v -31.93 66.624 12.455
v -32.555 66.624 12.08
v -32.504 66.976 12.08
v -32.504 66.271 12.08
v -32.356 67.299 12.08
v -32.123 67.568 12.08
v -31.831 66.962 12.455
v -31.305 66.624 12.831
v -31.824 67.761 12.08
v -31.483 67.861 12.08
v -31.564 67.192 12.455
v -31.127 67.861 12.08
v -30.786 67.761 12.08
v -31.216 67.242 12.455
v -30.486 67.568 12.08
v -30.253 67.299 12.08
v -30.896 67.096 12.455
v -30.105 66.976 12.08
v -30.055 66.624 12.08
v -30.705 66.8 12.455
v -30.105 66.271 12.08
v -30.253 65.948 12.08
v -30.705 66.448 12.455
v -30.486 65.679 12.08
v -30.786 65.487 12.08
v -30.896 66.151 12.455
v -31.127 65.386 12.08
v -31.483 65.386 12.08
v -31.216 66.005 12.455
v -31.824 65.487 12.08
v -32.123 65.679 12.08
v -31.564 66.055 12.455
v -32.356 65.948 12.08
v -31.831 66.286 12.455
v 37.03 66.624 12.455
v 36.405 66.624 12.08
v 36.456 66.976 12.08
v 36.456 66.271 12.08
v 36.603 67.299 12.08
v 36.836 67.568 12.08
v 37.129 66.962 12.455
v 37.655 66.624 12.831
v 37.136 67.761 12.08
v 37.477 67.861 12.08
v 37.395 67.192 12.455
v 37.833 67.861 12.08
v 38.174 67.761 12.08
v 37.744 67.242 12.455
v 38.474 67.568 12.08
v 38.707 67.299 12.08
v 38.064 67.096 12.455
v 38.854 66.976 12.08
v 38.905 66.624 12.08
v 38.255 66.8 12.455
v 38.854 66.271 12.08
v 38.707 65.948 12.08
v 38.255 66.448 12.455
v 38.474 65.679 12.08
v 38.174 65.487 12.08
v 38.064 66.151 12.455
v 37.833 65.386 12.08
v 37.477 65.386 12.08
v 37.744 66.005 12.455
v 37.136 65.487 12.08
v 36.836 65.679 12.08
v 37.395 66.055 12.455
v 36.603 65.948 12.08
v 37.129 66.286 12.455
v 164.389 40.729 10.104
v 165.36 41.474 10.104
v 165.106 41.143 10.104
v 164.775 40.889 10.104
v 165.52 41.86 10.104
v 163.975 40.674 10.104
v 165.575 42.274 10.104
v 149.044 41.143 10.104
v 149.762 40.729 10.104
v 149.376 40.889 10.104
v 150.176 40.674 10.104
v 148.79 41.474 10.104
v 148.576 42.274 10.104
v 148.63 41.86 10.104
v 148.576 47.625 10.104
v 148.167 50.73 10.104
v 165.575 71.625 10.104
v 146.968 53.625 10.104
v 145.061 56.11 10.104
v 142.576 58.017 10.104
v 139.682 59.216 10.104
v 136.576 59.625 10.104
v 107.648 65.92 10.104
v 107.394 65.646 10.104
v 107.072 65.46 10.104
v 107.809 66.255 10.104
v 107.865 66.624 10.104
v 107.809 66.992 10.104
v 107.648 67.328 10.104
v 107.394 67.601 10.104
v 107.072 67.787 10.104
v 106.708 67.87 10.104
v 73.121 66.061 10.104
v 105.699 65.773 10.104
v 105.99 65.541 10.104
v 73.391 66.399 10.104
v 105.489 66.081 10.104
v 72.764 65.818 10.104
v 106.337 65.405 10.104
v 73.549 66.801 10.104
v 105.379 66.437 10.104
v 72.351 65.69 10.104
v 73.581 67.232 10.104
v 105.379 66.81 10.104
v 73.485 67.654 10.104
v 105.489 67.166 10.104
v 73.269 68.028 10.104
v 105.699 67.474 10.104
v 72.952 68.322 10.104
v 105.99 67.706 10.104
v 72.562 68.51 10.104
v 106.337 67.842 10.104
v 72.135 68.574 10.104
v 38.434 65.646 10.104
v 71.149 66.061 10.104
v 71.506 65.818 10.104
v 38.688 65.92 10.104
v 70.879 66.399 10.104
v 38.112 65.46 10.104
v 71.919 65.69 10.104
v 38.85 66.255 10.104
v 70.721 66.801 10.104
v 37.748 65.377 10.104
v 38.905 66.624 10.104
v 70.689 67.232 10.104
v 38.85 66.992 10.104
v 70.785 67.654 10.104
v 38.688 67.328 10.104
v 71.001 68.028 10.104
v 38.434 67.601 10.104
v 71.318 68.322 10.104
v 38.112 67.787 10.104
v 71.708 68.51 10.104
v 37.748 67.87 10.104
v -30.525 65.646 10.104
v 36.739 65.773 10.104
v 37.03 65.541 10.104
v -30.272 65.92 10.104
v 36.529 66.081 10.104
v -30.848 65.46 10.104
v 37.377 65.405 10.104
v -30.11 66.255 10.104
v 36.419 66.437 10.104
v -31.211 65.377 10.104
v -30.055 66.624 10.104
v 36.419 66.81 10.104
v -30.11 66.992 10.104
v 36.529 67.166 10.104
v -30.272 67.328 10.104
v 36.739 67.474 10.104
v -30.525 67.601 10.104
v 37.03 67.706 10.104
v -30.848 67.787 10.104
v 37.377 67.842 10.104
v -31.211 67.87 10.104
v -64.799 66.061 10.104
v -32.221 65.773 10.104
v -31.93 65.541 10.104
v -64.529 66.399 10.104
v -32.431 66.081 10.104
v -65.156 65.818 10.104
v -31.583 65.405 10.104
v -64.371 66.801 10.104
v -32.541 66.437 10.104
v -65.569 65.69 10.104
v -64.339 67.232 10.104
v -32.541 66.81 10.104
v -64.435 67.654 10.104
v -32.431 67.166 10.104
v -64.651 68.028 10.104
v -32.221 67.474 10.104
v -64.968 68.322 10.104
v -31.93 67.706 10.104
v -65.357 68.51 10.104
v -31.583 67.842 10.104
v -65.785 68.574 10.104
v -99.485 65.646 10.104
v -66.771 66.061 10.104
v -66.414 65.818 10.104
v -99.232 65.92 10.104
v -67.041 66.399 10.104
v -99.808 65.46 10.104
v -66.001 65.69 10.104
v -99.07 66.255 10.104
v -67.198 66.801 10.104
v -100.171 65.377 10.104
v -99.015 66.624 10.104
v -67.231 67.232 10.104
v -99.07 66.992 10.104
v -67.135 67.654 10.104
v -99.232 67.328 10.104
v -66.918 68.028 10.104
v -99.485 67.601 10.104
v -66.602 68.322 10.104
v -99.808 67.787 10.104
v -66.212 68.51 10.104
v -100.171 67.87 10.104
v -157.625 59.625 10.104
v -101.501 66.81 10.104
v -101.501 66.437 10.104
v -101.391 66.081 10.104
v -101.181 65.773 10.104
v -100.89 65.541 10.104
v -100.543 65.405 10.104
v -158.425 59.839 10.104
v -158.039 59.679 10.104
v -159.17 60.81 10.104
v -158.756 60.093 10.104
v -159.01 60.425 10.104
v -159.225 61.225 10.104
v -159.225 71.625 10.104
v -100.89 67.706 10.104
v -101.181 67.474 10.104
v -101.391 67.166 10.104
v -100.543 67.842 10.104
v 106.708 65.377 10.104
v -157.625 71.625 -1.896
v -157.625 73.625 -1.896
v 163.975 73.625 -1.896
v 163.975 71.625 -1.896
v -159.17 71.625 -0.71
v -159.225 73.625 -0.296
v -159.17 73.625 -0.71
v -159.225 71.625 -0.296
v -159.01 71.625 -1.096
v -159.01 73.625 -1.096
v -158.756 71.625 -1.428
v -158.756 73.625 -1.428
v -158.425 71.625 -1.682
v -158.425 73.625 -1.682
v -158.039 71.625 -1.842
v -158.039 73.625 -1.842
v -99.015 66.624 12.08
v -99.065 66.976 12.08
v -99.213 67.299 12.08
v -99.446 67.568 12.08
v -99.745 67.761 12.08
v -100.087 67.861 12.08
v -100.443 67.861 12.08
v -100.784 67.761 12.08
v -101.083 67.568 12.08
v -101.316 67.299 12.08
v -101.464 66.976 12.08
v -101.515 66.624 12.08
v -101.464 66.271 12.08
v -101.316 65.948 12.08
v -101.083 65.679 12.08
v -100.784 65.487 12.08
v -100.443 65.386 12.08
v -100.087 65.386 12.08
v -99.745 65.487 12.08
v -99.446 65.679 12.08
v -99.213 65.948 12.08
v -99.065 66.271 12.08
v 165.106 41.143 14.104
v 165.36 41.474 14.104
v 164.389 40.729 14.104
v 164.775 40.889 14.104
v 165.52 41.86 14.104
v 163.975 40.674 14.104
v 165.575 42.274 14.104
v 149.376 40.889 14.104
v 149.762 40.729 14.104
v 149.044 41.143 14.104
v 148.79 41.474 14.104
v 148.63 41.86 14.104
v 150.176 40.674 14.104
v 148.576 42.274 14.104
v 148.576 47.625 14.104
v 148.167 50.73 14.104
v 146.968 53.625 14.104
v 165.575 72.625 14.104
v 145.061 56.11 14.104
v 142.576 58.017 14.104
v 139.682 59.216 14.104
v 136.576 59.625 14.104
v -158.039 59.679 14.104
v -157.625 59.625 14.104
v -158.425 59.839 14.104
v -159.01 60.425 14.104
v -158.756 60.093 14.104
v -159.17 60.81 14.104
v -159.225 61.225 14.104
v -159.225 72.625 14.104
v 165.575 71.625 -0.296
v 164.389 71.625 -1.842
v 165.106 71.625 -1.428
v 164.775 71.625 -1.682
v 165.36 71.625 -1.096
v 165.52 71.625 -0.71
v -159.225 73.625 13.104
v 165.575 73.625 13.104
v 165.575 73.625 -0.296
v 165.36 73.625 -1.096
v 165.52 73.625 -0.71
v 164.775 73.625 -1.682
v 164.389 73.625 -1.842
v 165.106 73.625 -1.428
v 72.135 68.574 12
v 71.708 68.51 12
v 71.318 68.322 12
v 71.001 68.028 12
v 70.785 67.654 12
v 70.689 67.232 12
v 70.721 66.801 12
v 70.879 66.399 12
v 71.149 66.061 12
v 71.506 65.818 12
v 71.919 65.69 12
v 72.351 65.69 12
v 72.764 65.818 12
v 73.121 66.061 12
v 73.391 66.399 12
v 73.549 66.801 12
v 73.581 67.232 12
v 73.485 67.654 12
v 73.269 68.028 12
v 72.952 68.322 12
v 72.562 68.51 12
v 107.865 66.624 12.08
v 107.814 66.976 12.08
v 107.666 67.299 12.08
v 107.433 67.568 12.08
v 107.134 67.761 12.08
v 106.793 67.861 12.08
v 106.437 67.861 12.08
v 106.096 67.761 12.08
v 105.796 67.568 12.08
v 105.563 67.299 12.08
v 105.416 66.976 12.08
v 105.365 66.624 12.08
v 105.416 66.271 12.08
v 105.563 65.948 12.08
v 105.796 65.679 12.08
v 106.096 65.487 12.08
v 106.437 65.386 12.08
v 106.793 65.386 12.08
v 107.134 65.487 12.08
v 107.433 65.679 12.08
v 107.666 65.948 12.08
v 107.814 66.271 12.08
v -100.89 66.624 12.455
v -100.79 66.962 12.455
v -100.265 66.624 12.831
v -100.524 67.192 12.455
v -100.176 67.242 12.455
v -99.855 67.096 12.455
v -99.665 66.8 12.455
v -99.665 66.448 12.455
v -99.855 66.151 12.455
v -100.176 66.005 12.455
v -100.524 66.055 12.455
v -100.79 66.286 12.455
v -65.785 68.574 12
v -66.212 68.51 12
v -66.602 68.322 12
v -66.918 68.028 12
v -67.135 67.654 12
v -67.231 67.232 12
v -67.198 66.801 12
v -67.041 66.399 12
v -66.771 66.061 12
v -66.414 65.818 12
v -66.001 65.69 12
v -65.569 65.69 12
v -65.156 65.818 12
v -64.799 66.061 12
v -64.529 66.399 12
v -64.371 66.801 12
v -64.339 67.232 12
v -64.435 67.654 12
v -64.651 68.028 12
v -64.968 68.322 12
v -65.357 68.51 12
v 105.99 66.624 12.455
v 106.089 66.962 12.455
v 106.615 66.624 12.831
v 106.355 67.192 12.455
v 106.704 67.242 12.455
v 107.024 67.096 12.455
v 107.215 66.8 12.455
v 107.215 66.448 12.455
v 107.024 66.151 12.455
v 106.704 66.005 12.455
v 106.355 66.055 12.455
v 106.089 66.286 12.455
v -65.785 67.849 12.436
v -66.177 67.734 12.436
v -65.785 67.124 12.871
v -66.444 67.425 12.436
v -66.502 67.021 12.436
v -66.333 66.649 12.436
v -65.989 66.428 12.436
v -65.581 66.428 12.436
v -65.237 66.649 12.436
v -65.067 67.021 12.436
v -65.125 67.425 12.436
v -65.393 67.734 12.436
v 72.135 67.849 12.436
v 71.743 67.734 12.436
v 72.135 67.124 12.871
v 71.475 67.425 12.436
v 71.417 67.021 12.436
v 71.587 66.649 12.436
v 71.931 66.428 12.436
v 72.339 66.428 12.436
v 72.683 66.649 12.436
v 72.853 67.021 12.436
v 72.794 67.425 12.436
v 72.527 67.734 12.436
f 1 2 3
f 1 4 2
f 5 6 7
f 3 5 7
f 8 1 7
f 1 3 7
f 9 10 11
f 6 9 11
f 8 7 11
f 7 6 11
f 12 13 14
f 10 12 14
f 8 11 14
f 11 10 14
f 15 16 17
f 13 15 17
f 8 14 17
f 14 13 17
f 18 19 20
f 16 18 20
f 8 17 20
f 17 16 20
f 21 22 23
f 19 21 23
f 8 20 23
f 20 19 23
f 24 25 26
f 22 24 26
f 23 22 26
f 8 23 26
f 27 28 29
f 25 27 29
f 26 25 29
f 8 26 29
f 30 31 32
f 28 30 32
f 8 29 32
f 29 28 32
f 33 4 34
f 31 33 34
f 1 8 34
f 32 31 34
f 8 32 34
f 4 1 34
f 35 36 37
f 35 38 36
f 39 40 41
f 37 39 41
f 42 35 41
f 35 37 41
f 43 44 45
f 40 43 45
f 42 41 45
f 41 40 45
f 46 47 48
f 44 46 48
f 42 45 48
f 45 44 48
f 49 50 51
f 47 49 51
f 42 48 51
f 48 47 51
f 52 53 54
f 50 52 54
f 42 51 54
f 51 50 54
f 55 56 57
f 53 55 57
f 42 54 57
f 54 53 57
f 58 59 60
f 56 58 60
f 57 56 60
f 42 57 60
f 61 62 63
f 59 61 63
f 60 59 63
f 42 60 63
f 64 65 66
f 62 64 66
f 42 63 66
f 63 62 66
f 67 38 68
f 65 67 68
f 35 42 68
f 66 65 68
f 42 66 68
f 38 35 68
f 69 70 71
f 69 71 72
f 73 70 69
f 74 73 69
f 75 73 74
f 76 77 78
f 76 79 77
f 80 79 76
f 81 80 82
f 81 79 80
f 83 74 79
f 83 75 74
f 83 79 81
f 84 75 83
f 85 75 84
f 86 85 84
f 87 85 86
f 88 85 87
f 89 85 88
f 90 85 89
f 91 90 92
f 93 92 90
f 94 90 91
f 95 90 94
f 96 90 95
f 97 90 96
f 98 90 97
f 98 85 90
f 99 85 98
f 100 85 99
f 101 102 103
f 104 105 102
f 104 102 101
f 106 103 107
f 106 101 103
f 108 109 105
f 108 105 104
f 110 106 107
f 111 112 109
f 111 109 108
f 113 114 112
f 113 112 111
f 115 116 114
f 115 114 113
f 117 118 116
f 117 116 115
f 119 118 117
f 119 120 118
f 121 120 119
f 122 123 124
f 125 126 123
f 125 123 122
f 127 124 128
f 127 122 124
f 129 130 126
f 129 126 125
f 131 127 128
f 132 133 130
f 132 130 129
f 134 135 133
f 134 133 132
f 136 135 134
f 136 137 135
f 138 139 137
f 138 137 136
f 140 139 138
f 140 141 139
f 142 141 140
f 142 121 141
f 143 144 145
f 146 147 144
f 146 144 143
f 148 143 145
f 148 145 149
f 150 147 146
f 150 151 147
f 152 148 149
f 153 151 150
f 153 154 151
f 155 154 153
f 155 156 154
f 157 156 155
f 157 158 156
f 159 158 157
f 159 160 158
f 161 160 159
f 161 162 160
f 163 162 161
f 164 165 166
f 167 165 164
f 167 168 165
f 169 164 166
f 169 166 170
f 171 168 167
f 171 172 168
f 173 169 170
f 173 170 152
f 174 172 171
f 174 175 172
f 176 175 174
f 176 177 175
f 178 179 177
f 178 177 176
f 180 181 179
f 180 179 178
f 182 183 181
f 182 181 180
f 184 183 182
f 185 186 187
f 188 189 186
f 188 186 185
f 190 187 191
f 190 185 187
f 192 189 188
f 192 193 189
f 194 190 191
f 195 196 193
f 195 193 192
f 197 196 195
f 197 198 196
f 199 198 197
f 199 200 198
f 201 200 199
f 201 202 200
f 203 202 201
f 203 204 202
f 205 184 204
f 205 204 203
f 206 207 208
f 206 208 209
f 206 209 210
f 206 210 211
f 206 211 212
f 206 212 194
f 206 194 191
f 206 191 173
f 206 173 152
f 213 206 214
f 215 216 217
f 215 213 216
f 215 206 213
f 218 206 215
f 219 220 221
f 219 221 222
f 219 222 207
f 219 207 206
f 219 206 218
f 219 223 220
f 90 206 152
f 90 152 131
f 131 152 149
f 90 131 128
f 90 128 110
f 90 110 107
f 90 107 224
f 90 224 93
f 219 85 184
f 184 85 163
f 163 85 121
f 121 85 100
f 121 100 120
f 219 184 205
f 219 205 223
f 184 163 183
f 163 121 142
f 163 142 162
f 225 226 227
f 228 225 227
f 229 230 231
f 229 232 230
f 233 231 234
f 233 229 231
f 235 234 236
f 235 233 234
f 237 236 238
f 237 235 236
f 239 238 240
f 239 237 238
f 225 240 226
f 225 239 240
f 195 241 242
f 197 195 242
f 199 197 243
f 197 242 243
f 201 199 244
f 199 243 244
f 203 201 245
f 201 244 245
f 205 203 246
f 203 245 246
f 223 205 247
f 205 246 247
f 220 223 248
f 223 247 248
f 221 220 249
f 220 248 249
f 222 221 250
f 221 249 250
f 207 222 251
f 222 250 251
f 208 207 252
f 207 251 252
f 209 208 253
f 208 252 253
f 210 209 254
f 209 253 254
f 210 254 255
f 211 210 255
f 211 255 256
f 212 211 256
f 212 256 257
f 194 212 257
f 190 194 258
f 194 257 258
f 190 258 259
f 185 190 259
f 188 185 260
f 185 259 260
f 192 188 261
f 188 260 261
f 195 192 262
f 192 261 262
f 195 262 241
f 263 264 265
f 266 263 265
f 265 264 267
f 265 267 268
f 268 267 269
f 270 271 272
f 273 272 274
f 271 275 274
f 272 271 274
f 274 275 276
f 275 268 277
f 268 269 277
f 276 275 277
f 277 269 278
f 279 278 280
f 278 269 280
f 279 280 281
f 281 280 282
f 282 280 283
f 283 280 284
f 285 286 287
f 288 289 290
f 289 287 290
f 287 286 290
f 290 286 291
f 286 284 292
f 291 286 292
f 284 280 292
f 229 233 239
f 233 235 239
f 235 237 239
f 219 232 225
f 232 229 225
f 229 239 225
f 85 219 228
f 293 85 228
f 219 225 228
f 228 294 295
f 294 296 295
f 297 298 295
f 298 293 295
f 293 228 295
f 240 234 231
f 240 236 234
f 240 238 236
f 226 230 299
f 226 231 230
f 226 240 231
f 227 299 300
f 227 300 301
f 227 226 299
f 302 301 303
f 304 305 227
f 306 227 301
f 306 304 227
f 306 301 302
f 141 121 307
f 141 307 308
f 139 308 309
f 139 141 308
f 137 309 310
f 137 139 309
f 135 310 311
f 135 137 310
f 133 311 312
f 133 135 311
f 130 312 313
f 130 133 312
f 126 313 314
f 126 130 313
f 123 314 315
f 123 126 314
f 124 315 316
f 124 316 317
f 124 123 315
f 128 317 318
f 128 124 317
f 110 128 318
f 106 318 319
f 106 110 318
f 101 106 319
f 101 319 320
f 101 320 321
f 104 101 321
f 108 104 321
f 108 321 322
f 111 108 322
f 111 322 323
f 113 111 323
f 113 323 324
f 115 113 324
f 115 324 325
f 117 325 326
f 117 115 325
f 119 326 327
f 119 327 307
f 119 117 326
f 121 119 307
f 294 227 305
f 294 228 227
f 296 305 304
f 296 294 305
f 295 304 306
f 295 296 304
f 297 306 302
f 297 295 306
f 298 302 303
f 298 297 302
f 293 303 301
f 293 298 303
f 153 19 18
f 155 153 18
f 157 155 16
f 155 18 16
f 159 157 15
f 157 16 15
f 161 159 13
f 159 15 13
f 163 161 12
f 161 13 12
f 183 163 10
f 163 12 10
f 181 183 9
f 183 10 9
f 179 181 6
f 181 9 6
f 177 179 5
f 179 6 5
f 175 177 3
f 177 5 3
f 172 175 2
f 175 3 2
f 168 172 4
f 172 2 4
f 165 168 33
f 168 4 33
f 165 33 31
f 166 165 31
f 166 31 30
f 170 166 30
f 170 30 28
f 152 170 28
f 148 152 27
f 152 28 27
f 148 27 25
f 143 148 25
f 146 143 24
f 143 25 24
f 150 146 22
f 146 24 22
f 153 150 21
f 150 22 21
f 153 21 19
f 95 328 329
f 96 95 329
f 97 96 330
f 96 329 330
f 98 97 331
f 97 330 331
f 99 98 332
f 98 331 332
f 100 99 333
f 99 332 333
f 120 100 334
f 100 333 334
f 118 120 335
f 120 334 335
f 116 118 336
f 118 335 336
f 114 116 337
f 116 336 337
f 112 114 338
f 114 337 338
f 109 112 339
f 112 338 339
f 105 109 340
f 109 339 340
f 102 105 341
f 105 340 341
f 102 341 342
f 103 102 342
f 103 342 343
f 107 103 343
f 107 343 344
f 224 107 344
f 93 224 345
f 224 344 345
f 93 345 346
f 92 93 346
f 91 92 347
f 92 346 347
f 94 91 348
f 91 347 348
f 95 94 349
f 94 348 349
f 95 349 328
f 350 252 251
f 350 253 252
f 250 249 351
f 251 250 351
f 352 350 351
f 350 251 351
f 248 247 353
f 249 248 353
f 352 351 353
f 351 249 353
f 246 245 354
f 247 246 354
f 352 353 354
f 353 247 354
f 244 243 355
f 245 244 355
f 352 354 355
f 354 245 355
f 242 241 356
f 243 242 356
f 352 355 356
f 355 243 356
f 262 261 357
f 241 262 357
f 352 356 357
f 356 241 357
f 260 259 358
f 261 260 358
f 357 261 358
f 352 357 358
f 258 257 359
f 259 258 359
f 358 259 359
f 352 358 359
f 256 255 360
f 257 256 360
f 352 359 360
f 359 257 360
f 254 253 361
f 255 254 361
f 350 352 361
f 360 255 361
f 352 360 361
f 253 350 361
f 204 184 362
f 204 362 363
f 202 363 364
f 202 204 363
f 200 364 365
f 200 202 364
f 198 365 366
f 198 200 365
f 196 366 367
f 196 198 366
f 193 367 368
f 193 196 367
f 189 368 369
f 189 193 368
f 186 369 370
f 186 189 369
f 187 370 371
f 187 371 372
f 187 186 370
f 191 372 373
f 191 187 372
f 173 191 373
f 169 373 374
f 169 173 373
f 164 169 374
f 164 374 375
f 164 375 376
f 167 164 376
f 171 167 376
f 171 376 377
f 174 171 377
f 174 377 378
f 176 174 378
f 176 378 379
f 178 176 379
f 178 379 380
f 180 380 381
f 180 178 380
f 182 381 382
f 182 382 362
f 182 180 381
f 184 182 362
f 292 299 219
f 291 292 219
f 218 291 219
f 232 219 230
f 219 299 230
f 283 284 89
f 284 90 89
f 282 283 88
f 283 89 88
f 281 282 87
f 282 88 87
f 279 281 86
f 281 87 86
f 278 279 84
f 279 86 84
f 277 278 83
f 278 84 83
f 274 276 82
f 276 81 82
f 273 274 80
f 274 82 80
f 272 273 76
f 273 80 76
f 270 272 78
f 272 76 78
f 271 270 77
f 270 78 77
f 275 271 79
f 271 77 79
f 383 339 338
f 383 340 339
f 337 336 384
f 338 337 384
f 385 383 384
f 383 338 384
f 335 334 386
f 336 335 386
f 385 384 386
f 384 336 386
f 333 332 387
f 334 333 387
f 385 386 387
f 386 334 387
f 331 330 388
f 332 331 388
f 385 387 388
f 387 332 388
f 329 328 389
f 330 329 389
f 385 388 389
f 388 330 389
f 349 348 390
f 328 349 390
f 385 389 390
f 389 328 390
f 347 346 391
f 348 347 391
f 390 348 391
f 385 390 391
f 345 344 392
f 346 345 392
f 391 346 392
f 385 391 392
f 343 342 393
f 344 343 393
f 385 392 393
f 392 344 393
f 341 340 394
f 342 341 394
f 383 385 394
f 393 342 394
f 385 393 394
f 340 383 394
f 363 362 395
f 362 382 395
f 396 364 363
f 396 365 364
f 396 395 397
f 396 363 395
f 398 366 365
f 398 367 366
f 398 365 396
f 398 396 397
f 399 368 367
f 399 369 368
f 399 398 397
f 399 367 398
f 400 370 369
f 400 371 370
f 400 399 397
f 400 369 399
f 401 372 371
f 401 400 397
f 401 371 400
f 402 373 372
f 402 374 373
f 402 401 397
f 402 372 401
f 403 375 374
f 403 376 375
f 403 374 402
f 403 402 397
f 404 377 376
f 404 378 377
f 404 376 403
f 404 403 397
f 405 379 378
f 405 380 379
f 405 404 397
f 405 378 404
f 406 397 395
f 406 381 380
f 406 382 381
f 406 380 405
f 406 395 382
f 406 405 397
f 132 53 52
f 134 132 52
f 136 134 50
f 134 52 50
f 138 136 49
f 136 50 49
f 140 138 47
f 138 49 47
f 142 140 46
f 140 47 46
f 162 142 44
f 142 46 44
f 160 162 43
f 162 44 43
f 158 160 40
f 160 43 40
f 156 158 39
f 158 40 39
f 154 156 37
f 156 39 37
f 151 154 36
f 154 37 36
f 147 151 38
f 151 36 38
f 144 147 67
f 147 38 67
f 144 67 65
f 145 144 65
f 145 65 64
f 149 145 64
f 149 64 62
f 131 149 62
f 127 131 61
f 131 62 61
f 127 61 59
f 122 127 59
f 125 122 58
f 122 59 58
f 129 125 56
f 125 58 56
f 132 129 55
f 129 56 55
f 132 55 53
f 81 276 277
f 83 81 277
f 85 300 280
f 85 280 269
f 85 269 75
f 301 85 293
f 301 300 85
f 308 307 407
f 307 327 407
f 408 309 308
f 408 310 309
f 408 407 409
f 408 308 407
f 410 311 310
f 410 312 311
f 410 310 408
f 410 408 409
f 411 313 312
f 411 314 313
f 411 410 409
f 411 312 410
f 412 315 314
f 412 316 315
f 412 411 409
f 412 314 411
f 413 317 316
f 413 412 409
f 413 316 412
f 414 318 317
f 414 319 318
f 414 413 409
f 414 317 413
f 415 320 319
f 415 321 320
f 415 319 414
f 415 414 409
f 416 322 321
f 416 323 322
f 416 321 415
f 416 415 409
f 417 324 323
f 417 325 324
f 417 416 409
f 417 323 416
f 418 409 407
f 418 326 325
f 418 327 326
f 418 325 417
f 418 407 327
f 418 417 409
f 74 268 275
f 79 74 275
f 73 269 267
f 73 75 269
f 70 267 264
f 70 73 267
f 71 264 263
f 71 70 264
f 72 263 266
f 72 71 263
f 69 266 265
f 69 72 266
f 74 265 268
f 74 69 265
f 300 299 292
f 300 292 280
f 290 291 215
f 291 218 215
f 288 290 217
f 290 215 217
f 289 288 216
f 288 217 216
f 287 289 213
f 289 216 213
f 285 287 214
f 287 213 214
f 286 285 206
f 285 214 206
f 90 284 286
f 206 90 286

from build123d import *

# Parameters (mm, degrees)
BOSS_EXTRUDE1_DEPTH                          = 4
SKETCH3_W                                    = 324.79935
SKETCH3_H                                    = 12
BOSS_EXTRUDE2_DEPTH                          = 2
FILLET1_SIZE                                 = 1
FILLET2_R                                    = 1.6
FILLET3_R                                    = 12
TAP_DRILL_FOR_M3X0_5_TAP1_D                  = 2.5
TAP_DRILL_FOR_M3X0_5_TAP1_DEPTH              = 7
TAP_DRILL_FOR_M3X0_5_TAP1_CSINK_D            = 2.55
TAP_DRILL_FOR_M3X0_5_TAP1_CSINK_ANGLE        = 90
TAP_DRILL_FOR_M3X0_5_TAP1_TIP                = 0.751075774
CBORE_FOR_M2_5_HEX_SOCKET_HEAD_CAP_S_2_COUNT = 2
CBORE_FOR_M2_5_HEX_SOCKET_HEAD_CAP_S_2_PITCH = 343.798403
CBORE_FOR_M2_5_HEX_SOCKET_HEAD_CAP_S_3_COUNT = 2
CBORE_FOR_M2_5_HEX_SOCKET_HEAD_CAP_S_3_PITCH = 369.079907741
CBORE_FOR_M2_5_HEX_SOCKET_HEAD_CAP_S_4_COUNT = 2
CBORE_FOR_M2_5_HEX_SOCKET_HEAD_CAP_S_4_PITCH = 275.745768266
CBORE_FOR_M2_5_HEX_SOCKET_HEAD_CAP_S_5_COUNT = 2
CBORE_FOR_M2_5_HEX_SOCKET_HEAD_CAP_S_5_PITCH = 169.171931368
CBORE_FOR_M2_5_HEX_SOCKET_HEAD_CAP_S_6_COUNT = 2
CBORE_FOR_M2_5_HEX_SOCKET_HEAD_CAP_S_6_PITCH = 134.248413


with BuildPart() as part:
    # Sketch2 → Boss-Extrude1 (new body)
    with BuildSketch(Plane.XY.offset(14.1038)):
        Polygon((-159.224575, 59.6246), (-159.224575, 73.6246), (165.574775, 73.6246), (165.574775, 59.6246), (165.574775, 40.6744), (148.575775, 40.6744), (148.575775, 59.6246), align=None)
    extrude(amount=-BOSS_EXTRUDE1_DEPTH)

    # Sketch3 → Boss-Extrude2 (add)
    with BuildSketch(Plane(origin=(0, 73.6246, 0), x_dir=(1, 0, 0), z_dir=(0, 1, 0))):
        with Locations((3.1751, -4.1038)):
            Rectangle(SKETCH3_W, SKETCH3_H)
    extrude(amount=-BOSS_EXTRUDE2_DEPTH)

    # Fillet1
    fillet1_edges = [part.edges().sort_by_distance(p)[0] for p in [
        (3.1751, 73.6246, 14.1038),
    ]]
    chamfer(fillet1_edges, length=FILLET1_SIZE)

    # Fillet2
    fillet2_edges = [part.edges().sort_by_distance(p)[0] for p in [
        (165.574775, 40.6744, 12.1038),
        (148.575775, 40.6744, 12.1038),
        (-159.224575, 59.6246, 12.1038),
        (165.574775, 72.6246, -1.8962),
        (-159.224575, 72.6246, -1.8962),
    ]]
    fillet(fillet2_edges, radius=FILLET2_R)

    # Fillet3
    fillet3_edges = [part.edges().sort_by_distance(p)[0] for p in [
        (148.575775, 59.6246, 12.1038),
    ]]
    fillet(fillet3_edges, radius=FILLET3_R)

    # Tap Drill for M3x0.5 Tap1
    with Locations(Plane(origin=(0, 0, 5.0798), x_dir=(-1, 0, 0), z_dir=(0, 0, -1))):
        with Locations((-106.614905, 66.623653), (-37.655035, 66.623653), (31.304835, 66.623653), (100.264705, 66.623653), (100.264705, -66.62476), (31.304835, -66.62476), (-37.655035, -66.62476), (-106.614905, -66.62476)):
            CounterSinkHole(TAP_DRILL_FOR_M3X0_5_TAP1_D / 2, TAP_DRILL_FOR_M3X0_5_TAP1_CSINK_D / 2, depth=TAP_DRILL_FOR_M3X0_5_TAP1_DEPTH, counter_sink_angle=TAP_DRILL_FOR_M3X0_5_TAP1_CSINK_ANGLE)
            with Locations((0, 0, -(TAP_DRILL_FOR_M3X0_5_TAP1_DEPTH + TAP_DRILL_FOR_M3X0_5_TAP1_TIP / 2))):  # 118° drill point
                Cone(0, TAP_DRILL_FOR_M3X0_5_TAP1_D / 2, TAP_DRILL_FOR_M3X0_5_TAP1_TIP, mode=Mode.SUBTRACT)

    # Sketch7 → CBORE for M2.5 Hex Socket Head Cap Screw1 (revolve, cut)
    with BuildSketch(Plane(origin=(-168.7241015, -67.1242865, -6), x_dir=(0, 1, 0), z_dir=(1, 0, 0))):
        Polygon((0, 0), (0, 18.871247898), (1.45, 18), (1.45, 5.9), (2.75, 5.9), (2.75, 0.025), (2.775, 0), align=None)
    cbore_for_m2_5_hex_socket_head_cap_screw = revolve(axis=Axis((-168.7241015, -67.1242865, -12.35), (0, 0, 1)), mode=Mode.SUBTRACT)

    # CBORE for M2.5 Hex Socket Head Cap S 2: CBORE for M2.5 Hex Socket Head Cap Screw1 ×2
    with Locations(*[(i * CBORE_FOR_M2_5_HEX_SOCKET_HEAD_CAP_S_2_PITCH, 0, 0) for i in range(1, CBORE_FOR_M2_5_HEX_SOCKET_HEAD_CAP_S_2_COUNT)]):
        add(cbore_for_m2_5_hex_socket_head_cap_screw, mode=Mode.SUBTRACT)

    # CBORE for M2.5 Hex Socket Head Cap S 3: CBORE for M2.5 Hex Socket Head Cap Screw1 ×2
    with Locations(*[Vector(0.9315012705620509, 0.3637380691394355, 0) * (i * CBORE_FOR_M2_5_HEX_SOCKET_HEAD_CAP_S_3_PITCH) for i in range(1, CBORE_FOR_M2_5_HEX_SOCKET_HEAD_CAP_S_3_COUNT)]):
        add(cbore_for_m2_5_hex_socket_head_cap_screw, mode=Mode.SUBTRACT)

    # CBORE for M2.5 Hex Socket Head Cap S 4: CBORE for M2.5 Hex Socket Head Cap Screw1 ×2
    with Locations(*[Vector(0.873482385656236, 0.48685575065751296, 0) * (i * CBORE_FOR_M2_5_HEX_SOCKET_HEAD_CAP_S_4_PITCH) for i in range(1, CBORE_FOR_M2_5_HEX_SOCKET_HEAD_CAP_S_4_COUNT)]):
        add(cbore_for_m2_5_hex_socket_head_cap_screw, mode=Mode.SUBTRACT)

    # CBORE for M2.5 Hex Socket Head Cap S 5: CBORE for M2.5 Hex Socket Head Cap Screw1 ×2
    with Locations(*[Vector(0.6084894265127476, 0.7935619810841417, 0) * (i * CBORE_FOR_M2_5_HEX_SOCKET_HEAD_CAP_S_5_PITCH) for i in range(1, CBORE_FOR_M2_5_HEX_SOCKET_HEAD_CAP_S_5_COUNT)]):
        add(cbore_for_m2_5_hex_socket_head_cap_screw, mode=Mode.SUBTRACT)

    # CBORE for M2.5 Hex Socket Head Cap S 6: CBORE for M2.5 Hex Socket Head Cap Screw1 ×2
    with Locations(*[(0, i * CBORE_FOR_M2_5_HEX_SOCKET_HEAD_CAP_S_6_PITCH, 0) for i in range(1, CBORE_FOR_M2_5_HEX_SOCKET_HEAD_CAP_S_6_COUNT)]):
        add(cbore_for_m2_5_hex_socket_head_cap_screw, mode=Mode.SUBTRACT)


solid = part.part
